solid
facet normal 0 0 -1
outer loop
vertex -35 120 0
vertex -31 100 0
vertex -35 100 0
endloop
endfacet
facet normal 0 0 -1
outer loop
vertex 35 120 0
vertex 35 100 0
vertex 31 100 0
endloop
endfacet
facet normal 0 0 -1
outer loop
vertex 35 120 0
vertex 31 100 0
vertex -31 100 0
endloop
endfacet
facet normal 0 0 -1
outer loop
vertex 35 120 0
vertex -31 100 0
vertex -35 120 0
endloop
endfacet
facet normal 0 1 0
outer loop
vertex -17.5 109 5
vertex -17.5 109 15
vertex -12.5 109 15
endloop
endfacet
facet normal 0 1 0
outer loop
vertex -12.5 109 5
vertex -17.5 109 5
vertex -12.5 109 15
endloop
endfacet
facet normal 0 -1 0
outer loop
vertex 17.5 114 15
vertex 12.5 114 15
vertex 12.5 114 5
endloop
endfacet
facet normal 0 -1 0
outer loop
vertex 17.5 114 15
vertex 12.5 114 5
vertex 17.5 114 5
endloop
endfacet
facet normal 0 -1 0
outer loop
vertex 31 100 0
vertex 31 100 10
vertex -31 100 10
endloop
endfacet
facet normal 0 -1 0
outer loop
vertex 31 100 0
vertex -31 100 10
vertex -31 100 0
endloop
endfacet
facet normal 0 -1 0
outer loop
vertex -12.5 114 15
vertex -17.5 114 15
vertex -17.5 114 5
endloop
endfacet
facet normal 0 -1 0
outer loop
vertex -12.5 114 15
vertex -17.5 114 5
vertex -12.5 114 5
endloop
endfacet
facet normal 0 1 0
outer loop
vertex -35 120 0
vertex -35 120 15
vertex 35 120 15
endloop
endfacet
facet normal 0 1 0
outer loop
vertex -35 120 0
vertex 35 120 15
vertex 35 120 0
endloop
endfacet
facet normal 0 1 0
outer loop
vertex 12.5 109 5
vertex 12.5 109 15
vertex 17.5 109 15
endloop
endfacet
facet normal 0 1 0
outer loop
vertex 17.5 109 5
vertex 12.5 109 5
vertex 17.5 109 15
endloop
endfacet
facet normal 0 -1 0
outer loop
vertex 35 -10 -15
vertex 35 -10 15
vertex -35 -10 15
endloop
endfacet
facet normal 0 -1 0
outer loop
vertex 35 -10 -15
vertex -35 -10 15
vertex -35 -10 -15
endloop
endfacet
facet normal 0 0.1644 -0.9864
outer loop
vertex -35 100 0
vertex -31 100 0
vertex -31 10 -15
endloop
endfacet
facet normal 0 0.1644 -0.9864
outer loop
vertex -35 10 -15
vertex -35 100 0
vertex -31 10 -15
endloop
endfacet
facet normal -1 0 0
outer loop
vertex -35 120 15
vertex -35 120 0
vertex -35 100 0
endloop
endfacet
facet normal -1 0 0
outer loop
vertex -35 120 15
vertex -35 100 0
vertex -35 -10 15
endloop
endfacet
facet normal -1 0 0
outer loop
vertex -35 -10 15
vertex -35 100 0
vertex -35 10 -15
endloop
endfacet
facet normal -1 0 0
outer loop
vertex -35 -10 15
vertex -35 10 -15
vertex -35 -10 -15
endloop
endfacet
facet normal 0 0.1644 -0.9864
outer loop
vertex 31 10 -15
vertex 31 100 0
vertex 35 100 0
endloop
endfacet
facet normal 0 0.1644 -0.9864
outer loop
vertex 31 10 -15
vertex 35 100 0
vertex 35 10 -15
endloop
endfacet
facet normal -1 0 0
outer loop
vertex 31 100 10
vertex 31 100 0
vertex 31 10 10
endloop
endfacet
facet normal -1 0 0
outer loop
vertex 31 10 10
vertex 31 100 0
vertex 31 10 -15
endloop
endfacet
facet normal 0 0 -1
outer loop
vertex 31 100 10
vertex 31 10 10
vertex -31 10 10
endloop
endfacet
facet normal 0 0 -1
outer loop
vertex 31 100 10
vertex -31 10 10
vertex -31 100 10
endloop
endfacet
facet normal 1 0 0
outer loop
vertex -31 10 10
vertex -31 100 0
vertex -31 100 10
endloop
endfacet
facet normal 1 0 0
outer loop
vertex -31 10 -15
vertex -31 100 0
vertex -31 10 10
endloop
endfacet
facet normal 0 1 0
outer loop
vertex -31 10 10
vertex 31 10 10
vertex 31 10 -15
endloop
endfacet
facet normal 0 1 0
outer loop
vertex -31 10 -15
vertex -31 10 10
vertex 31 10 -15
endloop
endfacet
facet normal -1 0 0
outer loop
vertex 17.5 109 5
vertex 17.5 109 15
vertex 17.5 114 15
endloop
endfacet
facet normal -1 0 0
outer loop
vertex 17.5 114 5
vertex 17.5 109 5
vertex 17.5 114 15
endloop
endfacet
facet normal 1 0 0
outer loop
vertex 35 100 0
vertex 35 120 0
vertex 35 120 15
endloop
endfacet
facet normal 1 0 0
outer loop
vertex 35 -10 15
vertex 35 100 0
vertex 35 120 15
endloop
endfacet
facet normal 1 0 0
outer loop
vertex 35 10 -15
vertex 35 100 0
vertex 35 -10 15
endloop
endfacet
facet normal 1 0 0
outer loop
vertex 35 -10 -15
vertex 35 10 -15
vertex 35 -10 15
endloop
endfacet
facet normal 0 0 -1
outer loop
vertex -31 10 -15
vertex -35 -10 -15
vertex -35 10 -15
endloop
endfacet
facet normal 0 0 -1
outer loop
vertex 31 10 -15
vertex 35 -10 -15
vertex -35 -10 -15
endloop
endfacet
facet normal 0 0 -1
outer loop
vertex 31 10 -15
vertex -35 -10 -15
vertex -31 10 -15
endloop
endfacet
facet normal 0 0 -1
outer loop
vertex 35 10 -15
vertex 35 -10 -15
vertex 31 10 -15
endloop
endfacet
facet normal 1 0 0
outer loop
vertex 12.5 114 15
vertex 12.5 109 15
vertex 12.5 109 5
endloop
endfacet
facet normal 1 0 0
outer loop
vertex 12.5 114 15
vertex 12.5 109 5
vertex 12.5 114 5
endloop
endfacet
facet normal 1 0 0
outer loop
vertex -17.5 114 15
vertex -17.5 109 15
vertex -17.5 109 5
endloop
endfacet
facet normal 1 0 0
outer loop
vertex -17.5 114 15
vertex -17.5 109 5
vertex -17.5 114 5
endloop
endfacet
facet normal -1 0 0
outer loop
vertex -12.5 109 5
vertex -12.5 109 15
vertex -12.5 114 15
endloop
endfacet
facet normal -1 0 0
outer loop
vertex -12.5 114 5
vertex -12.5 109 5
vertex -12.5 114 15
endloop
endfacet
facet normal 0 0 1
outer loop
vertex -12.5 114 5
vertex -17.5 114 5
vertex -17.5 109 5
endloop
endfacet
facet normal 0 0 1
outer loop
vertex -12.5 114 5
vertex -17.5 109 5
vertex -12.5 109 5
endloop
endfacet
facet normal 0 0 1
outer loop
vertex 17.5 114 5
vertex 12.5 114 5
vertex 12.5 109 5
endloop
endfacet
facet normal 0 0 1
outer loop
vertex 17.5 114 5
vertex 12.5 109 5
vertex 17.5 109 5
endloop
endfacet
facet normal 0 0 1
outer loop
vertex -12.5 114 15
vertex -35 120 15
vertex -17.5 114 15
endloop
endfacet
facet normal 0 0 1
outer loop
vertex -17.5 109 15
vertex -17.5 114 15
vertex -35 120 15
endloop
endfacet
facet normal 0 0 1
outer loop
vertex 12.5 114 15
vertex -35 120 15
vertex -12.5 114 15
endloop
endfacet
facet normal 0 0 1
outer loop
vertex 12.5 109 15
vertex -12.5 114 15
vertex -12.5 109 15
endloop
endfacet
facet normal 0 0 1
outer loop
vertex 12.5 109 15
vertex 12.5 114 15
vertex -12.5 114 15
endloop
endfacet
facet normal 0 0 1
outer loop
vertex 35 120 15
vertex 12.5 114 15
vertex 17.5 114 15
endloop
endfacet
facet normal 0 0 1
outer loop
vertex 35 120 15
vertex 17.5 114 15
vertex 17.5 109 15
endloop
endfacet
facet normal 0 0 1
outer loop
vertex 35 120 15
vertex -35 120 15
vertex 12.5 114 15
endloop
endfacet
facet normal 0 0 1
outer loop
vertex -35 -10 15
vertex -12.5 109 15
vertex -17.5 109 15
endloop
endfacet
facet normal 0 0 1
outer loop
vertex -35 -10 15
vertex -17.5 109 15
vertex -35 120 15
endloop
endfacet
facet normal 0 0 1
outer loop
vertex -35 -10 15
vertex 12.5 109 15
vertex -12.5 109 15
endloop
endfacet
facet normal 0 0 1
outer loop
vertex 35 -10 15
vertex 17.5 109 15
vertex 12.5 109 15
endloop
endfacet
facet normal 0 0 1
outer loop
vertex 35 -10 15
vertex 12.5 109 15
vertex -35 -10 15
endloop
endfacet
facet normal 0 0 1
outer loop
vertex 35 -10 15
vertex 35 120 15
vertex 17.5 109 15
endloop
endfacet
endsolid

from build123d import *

# Parameters (mm, degrees)
SKETCH1_W           = 5
SKETCH1_H           = 110
SKETCH1_W_2         = 30
SKETCH1_H_2         = 20
BOSS_EXTRUDE1_DEPTH = 35
SKETCH9_W           = 10
SKETCH9_H           = 20
BOSS_EXTRUDE2_DEPTH = 70
RIB1_REACH          = 141.732
SKETCH10_WALL_W     = 372.705210204
SKETCH10_WALL_H     = 4
SKETCH11_W          = 5
SKETCH11_H          = 5
CUT_EXTRUDE2_DEPTH  = 10


with BuildPart() as part:
    # Sketch1 → Boss-Extrude1 (new, symmetric)
    with BuildSketch(Plane(origin=(0, 0, 0), x_dir=(0, 0, -1), z_dir=(1, 0, 0))):
        with Locations((-12.5, 65)):
            Rectangle(SKETCH1_W, SKETCH1_H)
        Rectangle(SKETCH1_W_2, SKETCH1_H_2)
    extrude(amount=BOSS_EXTRUDE1_DEPTH, both=True)

    # Sketch9 → Boss-Extrude2 (add, through all)
    with BuildSketch(Plane(origin=(35, 0, 0), x_dir=(0, 0, -1), z_dir=(1, 0, 0))):
        with Locations((-5, 110)):
            Rectangle(SKETCH9_W, SKETCH9_H)
    extrude(amount=-BOSS_EXTRUDE2_DEPTH)

    # Sketch10 wall → Rib1 (add, up to next)
    with BuildSketch(Plane(origin=(35, 55, -7.5), x_dir=(0, -0.986393923832, -0.164398987305), z_dir=(0, 0.164398987305, -0.986393923832)), mode=Mode.PRIVATE) as rib1_sk1:
        with Locations((0, 2)):
            Rectangle(SKETCH10_WALL_W, SKETCH10_WALL_H)
    rib1_tool1 = extrude(rib1_sk1.sketch, amount=-RIB1_REACH, mode=Mode.PRIVATE) - part.part
    rib1 = rib1_tool1.solids().sort_by_distance((35, 55, -7.5))[0]
    add(rib1)

    # Mirror1: Rib1 across plane
    add(rib1.mirror(Plane(origin=(0, 0, 0), x_dir=(0, 0, 1), z_dir=(1, 0, 0))))

    # Sketch11 → Cut-Extrude2 (cut)
    with BuildSketch(Plane.XY.offset(15)):
        with Locations((15, 111.5)):
            Rectangle(SKETCH11_W, SKETCH11_H)
        with Locations((-15, 111.5)):
            Rectangle(SKETCH11_W, SKETCH11_H)
    extrude(amount=-CUT_EXTRUDE2_DEPTH, mode=Mode.SUBTRACT)


solid = part.part
